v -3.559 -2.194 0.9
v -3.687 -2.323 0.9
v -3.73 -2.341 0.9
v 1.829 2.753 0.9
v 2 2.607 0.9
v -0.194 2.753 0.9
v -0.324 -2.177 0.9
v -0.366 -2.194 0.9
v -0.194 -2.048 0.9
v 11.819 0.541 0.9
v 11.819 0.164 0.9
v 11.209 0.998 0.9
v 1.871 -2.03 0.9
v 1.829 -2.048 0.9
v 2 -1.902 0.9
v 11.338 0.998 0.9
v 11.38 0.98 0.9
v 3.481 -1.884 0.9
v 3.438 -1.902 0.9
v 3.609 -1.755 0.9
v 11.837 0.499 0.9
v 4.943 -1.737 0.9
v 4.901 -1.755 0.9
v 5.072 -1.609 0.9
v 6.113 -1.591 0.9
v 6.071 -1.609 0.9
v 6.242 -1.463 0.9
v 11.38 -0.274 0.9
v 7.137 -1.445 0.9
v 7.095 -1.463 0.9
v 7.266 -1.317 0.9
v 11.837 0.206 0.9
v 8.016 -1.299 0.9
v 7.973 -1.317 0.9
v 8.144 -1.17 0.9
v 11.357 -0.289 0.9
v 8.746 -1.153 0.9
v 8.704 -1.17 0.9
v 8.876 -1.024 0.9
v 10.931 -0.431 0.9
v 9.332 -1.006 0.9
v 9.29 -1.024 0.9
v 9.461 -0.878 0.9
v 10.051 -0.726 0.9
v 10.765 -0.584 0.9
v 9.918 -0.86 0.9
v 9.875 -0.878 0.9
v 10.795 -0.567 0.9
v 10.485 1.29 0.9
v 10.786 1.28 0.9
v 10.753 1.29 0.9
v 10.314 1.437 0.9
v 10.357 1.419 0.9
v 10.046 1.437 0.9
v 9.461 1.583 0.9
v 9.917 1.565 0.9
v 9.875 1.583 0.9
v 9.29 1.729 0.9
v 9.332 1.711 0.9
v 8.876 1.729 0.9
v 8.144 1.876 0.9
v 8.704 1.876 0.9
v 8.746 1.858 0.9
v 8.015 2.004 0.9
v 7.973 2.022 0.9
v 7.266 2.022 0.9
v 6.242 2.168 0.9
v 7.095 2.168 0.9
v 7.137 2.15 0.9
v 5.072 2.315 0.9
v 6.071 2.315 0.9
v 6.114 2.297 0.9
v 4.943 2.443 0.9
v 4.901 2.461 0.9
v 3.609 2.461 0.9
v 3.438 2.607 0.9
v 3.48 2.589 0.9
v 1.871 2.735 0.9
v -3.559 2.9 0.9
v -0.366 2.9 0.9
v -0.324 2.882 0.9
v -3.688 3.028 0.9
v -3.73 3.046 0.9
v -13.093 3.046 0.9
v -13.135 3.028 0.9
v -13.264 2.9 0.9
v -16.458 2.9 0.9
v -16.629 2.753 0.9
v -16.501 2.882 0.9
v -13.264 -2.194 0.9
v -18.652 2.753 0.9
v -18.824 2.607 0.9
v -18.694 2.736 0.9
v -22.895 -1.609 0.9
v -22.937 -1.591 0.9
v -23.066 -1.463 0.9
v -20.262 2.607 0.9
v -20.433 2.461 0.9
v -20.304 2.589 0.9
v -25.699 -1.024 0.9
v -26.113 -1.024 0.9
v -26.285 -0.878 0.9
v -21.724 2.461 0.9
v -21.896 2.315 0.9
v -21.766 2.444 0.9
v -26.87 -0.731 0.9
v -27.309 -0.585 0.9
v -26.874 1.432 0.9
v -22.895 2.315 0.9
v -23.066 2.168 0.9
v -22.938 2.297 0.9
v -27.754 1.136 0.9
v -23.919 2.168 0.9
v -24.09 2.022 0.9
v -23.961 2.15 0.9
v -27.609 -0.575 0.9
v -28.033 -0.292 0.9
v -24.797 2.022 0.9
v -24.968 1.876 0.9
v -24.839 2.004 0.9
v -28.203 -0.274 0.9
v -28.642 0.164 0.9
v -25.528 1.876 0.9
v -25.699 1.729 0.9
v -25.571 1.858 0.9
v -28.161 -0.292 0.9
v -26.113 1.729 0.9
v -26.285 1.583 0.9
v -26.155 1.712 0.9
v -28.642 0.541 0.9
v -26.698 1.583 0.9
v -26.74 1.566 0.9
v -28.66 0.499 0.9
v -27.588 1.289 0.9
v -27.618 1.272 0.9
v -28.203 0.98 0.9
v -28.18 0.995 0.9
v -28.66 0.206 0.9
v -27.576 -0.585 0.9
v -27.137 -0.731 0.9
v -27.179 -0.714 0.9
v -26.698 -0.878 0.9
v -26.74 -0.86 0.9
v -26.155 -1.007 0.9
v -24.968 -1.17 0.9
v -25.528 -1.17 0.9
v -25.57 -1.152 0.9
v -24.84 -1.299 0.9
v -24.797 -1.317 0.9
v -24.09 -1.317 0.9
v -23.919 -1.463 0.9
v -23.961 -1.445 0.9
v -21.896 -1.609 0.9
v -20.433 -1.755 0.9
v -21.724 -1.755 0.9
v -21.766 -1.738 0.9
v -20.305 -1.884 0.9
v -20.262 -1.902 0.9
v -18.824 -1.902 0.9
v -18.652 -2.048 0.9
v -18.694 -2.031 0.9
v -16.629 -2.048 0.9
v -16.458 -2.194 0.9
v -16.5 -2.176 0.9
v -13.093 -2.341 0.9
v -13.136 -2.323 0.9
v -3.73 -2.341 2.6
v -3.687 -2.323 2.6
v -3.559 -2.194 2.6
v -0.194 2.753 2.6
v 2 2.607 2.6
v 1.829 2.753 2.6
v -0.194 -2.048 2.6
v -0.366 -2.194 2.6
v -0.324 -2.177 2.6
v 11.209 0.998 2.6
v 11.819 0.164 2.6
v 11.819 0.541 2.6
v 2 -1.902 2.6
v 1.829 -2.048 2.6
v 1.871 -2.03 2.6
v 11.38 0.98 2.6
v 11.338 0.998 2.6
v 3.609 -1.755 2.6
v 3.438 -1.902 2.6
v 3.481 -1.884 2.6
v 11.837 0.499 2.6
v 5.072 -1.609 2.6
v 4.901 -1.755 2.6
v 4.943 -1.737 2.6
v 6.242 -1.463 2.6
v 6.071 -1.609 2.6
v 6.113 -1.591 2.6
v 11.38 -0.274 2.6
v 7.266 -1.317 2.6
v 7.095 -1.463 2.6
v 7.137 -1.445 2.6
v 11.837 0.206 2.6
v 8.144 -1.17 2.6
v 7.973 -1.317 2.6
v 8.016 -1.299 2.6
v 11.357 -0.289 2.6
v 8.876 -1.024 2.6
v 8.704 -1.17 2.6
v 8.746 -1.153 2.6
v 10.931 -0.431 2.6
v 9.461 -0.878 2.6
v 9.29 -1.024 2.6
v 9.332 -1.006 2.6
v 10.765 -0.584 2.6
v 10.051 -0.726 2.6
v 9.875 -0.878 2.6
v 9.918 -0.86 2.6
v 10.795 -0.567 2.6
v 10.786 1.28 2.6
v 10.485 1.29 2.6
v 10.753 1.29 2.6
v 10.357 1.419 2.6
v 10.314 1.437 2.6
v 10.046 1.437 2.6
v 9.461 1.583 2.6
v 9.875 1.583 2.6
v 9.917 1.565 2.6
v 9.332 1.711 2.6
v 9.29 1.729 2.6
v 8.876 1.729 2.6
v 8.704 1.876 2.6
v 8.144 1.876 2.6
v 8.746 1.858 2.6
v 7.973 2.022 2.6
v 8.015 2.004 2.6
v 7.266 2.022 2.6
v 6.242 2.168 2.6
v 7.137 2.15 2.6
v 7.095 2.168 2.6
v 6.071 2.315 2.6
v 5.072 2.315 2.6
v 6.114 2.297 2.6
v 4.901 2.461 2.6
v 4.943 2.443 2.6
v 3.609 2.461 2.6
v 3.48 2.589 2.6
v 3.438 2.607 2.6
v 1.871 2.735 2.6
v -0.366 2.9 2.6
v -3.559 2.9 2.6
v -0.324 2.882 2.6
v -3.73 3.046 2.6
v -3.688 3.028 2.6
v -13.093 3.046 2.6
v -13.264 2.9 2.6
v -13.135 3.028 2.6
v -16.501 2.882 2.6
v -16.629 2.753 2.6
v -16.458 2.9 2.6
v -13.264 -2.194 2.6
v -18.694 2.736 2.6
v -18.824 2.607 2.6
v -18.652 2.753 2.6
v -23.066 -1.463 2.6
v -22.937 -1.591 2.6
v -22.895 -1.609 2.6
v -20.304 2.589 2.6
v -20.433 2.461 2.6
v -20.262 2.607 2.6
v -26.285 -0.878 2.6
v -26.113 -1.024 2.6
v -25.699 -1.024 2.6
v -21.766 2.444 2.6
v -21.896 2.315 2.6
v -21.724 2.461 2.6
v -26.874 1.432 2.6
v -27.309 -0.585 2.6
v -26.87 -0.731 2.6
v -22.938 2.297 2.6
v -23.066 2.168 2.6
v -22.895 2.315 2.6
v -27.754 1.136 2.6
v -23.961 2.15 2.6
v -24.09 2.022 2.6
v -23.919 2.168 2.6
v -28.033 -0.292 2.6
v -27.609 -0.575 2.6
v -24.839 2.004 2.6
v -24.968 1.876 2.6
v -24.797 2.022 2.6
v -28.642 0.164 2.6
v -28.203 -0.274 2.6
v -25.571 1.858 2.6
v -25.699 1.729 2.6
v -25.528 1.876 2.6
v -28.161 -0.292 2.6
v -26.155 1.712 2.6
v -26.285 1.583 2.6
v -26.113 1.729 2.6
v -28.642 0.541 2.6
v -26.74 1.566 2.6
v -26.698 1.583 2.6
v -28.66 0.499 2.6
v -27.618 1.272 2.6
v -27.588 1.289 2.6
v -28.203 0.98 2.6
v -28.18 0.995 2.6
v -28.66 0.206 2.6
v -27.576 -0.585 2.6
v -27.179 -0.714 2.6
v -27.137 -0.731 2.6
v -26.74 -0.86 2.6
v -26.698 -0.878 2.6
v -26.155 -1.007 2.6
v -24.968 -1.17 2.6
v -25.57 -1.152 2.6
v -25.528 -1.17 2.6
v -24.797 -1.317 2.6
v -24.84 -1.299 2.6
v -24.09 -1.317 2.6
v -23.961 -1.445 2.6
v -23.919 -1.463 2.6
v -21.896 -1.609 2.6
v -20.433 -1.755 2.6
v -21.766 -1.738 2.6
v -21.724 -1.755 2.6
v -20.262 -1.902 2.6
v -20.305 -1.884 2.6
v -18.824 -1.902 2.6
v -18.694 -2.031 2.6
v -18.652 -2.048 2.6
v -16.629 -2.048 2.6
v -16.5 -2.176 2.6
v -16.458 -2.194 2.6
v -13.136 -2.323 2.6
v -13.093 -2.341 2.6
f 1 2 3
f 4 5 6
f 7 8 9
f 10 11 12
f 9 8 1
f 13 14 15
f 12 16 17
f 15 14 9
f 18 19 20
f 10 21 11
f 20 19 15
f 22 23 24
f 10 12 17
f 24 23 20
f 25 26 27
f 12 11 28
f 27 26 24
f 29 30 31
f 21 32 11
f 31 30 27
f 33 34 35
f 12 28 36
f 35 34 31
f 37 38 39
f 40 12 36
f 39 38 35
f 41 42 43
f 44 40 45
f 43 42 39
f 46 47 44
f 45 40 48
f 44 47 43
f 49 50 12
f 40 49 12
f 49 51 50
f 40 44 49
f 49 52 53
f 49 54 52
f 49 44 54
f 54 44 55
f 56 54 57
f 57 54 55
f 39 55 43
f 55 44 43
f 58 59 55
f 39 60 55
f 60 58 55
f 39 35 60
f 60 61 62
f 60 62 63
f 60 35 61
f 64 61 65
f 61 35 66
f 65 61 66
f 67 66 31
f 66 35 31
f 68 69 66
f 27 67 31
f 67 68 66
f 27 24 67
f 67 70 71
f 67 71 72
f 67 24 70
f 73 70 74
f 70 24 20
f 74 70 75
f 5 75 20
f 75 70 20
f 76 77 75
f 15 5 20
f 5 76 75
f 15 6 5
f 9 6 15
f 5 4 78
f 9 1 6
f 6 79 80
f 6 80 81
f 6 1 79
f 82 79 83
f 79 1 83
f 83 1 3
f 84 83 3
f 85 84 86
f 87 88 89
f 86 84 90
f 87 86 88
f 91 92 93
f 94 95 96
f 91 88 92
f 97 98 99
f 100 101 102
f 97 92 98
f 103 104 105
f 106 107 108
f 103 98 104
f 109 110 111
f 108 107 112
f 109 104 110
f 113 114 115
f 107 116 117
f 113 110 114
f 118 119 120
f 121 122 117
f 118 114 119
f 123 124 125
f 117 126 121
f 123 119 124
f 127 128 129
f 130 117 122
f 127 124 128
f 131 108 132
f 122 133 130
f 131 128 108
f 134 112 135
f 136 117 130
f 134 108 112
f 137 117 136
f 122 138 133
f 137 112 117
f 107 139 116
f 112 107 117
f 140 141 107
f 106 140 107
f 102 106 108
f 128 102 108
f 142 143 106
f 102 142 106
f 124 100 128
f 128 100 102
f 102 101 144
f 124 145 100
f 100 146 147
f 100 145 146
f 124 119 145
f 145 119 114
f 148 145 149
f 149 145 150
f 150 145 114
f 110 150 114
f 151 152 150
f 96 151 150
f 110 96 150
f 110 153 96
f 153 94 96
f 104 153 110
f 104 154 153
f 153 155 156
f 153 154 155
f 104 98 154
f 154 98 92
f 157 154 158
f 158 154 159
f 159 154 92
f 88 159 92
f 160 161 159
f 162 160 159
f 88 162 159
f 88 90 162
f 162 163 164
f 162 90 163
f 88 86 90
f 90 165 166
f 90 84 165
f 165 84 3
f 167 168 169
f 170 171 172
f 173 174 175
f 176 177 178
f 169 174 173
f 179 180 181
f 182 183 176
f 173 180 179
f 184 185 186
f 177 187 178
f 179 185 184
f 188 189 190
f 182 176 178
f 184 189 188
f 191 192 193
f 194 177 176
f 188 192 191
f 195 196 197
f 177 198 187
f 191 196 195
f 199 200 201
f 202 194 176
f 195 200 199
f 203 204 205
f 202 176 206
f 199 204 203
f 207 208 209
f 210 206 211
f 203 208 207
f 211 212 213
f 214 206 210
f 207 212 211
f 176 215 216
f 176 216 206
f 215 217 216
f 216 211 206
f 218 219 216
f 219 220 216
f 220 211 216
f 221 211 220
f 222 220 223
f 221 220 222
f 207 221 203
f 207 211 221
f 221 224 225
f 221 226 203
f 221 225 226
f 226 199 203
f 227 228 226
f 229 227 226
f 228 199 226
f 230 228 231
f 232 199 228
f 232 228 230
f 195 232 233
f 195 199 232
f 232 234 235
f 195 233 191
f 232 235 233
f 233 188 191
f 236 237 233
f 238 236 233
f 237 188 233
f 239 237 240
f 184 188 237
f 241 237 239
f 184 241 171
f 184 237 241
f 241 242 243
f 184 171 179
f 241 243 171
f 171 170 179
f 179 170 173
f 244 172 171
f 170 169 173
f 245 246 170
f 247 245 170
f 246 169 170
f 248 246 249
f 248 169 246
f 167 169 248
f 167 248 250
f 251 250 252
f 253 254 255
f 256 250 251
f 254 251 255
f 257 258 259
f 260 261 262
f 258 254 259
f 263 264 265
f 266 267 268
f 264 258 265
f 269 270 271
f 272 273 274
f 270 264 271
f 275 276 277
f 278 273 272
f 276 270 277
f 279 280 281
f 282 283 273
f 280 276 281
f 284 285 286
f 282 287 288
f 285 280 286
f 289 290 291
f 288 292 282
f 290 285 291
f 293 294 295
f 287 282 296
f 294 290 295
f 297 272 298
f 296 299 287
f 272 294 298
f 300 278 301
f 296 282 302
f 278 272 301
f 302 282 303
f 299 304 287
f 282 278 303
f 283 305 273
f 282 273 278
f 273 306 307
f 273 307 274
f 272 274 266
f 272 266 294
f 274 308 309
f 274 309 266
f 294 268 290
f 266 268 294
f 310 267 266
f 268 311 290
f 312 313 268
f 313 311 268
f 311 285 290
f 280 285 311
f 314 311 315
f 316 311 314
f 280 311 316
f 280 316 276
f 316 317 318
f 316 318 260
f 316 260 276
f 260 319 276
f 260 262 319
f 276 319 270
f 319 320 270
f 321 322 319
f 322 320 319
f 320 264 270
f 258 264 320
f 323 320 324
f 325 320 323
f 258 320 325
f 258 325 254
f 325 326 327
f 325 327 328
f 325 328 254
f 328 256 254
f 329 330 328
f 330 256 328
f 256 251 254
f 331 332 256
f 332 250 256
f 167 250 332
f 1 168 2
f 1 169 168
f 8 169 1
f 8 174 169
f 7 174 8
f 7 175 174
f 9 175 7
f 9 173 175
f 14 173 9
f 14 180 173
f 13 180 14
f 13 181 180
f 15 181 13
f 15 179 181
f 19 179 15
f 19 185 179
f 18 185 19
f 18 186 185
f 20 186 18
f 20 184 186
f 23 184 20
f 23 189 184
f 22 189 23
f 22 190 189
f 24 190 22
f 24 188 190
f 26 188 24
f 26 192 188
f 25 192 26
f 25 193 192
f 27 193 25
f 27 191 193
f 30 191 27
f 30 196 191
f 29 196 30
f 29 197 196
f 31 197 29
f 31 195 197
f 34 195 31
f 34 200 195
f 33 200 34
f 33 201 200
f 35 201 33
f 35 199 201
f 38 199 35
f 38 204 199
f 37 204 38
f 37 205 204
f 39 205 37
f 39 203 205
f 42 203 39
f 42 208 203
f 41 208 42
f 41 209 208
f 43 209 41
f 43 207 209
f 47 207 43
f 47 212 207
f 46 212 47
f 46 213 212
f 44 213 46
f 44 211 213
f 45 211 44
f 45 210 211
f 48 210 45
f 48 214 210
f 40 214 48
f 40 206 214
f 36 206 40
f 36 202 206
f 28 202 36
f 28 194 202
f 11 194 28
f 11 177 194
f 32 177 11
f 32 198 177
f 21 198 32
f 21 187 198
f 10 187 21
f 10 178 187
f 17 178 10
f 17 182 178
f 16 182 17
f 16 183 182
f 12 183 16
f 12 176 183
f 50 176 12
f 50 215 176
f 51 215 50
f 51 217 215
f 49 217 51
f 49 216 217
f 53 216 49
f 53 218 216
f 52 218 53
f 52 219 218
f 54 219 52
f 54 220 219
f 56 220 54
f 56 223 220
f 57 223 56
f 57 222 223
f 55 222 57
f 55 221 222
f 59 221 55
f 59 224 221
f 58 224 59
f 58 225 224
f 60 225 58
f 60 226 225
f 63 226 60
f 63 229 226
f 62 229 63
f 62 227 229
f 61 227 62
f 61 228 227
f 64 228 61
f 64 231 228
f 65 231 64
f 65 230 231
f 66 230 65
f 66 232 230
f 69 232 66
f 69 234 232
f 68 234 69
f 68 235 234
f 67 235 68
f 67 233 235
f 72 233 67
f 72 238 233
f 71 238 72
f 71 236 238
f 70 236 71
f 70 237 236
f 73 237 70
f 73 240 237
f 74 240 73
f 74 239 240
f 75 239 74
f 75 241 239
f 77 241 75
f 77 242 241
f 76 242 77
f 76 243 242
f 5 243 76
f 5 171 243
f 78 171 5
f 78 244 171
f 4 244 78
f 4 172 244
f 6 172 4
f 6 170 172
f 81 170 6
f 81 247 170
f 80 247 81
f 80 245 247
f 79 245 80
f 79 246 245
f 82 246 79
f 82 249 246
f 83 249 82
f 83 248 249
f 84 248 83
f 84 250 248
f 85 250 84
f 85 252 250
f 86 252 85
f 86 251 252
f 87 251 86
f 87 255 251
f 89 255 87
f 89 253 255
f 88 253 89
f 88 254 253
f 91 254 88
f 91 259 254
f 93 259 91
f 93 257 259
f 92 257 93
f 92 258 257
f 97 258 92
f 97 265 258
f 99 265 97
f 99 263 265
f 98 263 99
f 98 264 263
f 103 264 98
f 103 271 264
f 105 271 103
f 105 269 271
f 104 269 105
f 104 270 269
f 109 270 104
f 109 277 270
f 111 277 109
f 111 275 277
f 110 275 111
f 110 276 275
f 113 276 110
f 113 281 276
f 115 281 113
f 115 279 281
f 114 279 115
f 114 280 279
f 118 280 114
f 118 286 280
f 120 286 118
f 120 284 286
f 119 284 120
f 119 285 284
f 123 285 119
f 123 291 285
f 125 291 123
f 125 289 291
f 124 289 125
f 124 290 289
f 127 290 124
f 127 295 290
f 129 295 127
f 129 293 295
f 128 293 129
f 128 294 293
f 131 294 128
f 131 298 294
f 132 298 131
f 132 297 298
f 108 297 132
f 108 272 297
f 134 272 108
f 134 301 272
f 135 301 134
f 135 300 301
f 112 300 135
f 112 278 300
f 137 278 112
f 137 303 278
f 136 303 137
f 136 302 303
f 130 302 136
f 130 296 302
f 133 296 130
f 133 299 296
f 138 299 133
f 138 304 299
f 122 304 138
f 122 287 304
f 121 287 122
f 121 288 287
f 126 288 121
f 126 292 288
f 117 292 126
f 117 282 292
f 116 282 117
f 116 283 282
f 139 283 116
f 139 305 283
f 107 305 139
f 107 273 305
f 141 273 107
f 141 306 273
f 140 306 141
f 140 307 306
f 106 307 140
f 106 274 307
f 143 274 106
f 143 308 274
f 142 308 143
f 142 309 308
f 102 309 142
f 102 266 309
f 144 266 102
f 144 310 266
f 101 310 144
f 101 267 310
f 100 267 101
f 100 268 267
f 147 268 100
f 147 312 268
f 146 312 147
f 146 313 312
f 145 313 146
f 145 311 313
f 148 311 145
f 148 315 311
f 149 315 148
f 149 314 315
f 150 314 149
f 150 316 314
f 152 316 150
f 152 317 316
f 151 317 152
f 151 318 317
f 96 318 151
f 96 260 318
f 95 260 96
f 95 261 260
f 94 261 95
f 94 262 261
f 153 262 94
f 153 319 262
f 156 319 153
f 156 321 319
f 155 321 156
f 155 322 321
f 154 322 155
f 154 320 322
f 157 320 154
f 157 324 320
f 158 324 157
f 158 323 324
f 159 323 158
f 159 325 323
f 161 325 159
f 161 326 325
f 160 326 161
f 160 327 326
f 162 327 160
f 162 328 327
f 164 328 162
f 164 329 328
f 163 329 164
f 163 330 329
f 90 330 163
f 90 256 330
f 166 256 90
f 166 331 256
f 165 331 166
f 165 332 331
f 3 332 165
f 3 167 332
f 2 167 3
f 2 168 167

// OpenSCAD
$fn = 24;
translate([0, -2.500, 0.900])
  linear_extrude(height=1.700) {
offset(r=0.06, $fn=8) {
    polygon(points=[[-28.600,2.999],[-28.600,2.706],[-28.161,2.268],[-28.015,2.268],[-27.576,1.975],[-27.284,1.975],[-27.137,1.829],[-26.845,1.829],[-26.698,1.682],[-26.260,1.682],[-26.113,1.536],[-25.674,1.536],[-25.528,1.390],[-24.943,1.390],[-24.797,1.243],[-24.065,1.243],[-23.919,1.097],[-23.041,1.097],[-22.895,0.951],[-21.871,0.951],[-21.724,0.805],[-20.408,0.805],[-20.262,0.658],[-18.799,0.658],[-18.652,0.512],[-16.604,0.512],[-16.458,0.366],[-13.239,0.366],[-13.093,0.219],[-3.730,0.219],[-3.584,0.366],[-0.366,0.366],[-0.219,0.512],[1.829,0.512],[1.975,0.658],[3.438,0.658],[3.584,0.805],[4.901,0.805],[5.047,0.951],[6.071,0.951],[6.217,1.097],[7.095,1.097],[7.241,1.243],[7.973,1.243],[8.119,1.390],[8.704,1.390],[8.851,1.536],[9.290,1.536],[9.436,1.682],[9.875,1.682],[10.021,1.829],[10.753,1.975],[10.899,2.121],[11.338,2.268],[11.777,2.706],[11.777,2.999],[11.338,3.438],[11.191,3.438],[10.753,3.730],[10.460,3.730],[10.314,3.877],[10.021,3.877],[9.875,4.023],[9.436,4.023],[9.290,4.169],[8.851,4.169],[8.704,4.316],[8.119,4.316],[7.973,4.462],[7.241,4.462],[7.095,4.608],[6.217,4.608],[6.071,4.755],[5.047,4.755],[4.901,4.901],[3.584,4.901],[3.438,5.047],[1.975,5.047],[1.829,5.193],[-0.219,5.193],[-0.366,5.340],[-3.584,5.340],[-3.730,5.486],[-13.093,5.486],[-13.239,5.340],[-16.458,5.340],[-16.604,5.193],[-18.652,5.193],[-18.799,5.047],[-20.262,5.047],[-20.408,4.901],[-21.724,4.901],[-21.871,4.755],[-22.895,4.755],[-23.041,4.608],[-23.919,4.608],[-24.065,4.462],[-24.797,4.462],[-24.943,4.316],[-25.528,4.316],[-25.674,4.169],[-26.113,4.169],[-26.260,4.023],[-26.698,4.023],[-26.845,3.877],[-27.576,3.730],[-27.722,3.584],[-28.161,3.438]], paths=[[0,1,2,3,4,5,6,7,8,9,10,11,12,13,14,15,16,17,18,19,20,21,22,23,24,25,26,27,28,29,30,31,32,33,34,35,36,37,38,39,40,41,42,43,44,45,46,47,48,49,50,51,52,53,54,55,56,57,58,59,60,61,62,63,64,65,66,67,68,69,70,71,72,73,74,75,76,77,78,79,80,81,82,83,84,85,86,87,88,89,90,91,92,93,94,95,96,97,98,99,100,101,102,103,104,105,106,107]]);
}
}
